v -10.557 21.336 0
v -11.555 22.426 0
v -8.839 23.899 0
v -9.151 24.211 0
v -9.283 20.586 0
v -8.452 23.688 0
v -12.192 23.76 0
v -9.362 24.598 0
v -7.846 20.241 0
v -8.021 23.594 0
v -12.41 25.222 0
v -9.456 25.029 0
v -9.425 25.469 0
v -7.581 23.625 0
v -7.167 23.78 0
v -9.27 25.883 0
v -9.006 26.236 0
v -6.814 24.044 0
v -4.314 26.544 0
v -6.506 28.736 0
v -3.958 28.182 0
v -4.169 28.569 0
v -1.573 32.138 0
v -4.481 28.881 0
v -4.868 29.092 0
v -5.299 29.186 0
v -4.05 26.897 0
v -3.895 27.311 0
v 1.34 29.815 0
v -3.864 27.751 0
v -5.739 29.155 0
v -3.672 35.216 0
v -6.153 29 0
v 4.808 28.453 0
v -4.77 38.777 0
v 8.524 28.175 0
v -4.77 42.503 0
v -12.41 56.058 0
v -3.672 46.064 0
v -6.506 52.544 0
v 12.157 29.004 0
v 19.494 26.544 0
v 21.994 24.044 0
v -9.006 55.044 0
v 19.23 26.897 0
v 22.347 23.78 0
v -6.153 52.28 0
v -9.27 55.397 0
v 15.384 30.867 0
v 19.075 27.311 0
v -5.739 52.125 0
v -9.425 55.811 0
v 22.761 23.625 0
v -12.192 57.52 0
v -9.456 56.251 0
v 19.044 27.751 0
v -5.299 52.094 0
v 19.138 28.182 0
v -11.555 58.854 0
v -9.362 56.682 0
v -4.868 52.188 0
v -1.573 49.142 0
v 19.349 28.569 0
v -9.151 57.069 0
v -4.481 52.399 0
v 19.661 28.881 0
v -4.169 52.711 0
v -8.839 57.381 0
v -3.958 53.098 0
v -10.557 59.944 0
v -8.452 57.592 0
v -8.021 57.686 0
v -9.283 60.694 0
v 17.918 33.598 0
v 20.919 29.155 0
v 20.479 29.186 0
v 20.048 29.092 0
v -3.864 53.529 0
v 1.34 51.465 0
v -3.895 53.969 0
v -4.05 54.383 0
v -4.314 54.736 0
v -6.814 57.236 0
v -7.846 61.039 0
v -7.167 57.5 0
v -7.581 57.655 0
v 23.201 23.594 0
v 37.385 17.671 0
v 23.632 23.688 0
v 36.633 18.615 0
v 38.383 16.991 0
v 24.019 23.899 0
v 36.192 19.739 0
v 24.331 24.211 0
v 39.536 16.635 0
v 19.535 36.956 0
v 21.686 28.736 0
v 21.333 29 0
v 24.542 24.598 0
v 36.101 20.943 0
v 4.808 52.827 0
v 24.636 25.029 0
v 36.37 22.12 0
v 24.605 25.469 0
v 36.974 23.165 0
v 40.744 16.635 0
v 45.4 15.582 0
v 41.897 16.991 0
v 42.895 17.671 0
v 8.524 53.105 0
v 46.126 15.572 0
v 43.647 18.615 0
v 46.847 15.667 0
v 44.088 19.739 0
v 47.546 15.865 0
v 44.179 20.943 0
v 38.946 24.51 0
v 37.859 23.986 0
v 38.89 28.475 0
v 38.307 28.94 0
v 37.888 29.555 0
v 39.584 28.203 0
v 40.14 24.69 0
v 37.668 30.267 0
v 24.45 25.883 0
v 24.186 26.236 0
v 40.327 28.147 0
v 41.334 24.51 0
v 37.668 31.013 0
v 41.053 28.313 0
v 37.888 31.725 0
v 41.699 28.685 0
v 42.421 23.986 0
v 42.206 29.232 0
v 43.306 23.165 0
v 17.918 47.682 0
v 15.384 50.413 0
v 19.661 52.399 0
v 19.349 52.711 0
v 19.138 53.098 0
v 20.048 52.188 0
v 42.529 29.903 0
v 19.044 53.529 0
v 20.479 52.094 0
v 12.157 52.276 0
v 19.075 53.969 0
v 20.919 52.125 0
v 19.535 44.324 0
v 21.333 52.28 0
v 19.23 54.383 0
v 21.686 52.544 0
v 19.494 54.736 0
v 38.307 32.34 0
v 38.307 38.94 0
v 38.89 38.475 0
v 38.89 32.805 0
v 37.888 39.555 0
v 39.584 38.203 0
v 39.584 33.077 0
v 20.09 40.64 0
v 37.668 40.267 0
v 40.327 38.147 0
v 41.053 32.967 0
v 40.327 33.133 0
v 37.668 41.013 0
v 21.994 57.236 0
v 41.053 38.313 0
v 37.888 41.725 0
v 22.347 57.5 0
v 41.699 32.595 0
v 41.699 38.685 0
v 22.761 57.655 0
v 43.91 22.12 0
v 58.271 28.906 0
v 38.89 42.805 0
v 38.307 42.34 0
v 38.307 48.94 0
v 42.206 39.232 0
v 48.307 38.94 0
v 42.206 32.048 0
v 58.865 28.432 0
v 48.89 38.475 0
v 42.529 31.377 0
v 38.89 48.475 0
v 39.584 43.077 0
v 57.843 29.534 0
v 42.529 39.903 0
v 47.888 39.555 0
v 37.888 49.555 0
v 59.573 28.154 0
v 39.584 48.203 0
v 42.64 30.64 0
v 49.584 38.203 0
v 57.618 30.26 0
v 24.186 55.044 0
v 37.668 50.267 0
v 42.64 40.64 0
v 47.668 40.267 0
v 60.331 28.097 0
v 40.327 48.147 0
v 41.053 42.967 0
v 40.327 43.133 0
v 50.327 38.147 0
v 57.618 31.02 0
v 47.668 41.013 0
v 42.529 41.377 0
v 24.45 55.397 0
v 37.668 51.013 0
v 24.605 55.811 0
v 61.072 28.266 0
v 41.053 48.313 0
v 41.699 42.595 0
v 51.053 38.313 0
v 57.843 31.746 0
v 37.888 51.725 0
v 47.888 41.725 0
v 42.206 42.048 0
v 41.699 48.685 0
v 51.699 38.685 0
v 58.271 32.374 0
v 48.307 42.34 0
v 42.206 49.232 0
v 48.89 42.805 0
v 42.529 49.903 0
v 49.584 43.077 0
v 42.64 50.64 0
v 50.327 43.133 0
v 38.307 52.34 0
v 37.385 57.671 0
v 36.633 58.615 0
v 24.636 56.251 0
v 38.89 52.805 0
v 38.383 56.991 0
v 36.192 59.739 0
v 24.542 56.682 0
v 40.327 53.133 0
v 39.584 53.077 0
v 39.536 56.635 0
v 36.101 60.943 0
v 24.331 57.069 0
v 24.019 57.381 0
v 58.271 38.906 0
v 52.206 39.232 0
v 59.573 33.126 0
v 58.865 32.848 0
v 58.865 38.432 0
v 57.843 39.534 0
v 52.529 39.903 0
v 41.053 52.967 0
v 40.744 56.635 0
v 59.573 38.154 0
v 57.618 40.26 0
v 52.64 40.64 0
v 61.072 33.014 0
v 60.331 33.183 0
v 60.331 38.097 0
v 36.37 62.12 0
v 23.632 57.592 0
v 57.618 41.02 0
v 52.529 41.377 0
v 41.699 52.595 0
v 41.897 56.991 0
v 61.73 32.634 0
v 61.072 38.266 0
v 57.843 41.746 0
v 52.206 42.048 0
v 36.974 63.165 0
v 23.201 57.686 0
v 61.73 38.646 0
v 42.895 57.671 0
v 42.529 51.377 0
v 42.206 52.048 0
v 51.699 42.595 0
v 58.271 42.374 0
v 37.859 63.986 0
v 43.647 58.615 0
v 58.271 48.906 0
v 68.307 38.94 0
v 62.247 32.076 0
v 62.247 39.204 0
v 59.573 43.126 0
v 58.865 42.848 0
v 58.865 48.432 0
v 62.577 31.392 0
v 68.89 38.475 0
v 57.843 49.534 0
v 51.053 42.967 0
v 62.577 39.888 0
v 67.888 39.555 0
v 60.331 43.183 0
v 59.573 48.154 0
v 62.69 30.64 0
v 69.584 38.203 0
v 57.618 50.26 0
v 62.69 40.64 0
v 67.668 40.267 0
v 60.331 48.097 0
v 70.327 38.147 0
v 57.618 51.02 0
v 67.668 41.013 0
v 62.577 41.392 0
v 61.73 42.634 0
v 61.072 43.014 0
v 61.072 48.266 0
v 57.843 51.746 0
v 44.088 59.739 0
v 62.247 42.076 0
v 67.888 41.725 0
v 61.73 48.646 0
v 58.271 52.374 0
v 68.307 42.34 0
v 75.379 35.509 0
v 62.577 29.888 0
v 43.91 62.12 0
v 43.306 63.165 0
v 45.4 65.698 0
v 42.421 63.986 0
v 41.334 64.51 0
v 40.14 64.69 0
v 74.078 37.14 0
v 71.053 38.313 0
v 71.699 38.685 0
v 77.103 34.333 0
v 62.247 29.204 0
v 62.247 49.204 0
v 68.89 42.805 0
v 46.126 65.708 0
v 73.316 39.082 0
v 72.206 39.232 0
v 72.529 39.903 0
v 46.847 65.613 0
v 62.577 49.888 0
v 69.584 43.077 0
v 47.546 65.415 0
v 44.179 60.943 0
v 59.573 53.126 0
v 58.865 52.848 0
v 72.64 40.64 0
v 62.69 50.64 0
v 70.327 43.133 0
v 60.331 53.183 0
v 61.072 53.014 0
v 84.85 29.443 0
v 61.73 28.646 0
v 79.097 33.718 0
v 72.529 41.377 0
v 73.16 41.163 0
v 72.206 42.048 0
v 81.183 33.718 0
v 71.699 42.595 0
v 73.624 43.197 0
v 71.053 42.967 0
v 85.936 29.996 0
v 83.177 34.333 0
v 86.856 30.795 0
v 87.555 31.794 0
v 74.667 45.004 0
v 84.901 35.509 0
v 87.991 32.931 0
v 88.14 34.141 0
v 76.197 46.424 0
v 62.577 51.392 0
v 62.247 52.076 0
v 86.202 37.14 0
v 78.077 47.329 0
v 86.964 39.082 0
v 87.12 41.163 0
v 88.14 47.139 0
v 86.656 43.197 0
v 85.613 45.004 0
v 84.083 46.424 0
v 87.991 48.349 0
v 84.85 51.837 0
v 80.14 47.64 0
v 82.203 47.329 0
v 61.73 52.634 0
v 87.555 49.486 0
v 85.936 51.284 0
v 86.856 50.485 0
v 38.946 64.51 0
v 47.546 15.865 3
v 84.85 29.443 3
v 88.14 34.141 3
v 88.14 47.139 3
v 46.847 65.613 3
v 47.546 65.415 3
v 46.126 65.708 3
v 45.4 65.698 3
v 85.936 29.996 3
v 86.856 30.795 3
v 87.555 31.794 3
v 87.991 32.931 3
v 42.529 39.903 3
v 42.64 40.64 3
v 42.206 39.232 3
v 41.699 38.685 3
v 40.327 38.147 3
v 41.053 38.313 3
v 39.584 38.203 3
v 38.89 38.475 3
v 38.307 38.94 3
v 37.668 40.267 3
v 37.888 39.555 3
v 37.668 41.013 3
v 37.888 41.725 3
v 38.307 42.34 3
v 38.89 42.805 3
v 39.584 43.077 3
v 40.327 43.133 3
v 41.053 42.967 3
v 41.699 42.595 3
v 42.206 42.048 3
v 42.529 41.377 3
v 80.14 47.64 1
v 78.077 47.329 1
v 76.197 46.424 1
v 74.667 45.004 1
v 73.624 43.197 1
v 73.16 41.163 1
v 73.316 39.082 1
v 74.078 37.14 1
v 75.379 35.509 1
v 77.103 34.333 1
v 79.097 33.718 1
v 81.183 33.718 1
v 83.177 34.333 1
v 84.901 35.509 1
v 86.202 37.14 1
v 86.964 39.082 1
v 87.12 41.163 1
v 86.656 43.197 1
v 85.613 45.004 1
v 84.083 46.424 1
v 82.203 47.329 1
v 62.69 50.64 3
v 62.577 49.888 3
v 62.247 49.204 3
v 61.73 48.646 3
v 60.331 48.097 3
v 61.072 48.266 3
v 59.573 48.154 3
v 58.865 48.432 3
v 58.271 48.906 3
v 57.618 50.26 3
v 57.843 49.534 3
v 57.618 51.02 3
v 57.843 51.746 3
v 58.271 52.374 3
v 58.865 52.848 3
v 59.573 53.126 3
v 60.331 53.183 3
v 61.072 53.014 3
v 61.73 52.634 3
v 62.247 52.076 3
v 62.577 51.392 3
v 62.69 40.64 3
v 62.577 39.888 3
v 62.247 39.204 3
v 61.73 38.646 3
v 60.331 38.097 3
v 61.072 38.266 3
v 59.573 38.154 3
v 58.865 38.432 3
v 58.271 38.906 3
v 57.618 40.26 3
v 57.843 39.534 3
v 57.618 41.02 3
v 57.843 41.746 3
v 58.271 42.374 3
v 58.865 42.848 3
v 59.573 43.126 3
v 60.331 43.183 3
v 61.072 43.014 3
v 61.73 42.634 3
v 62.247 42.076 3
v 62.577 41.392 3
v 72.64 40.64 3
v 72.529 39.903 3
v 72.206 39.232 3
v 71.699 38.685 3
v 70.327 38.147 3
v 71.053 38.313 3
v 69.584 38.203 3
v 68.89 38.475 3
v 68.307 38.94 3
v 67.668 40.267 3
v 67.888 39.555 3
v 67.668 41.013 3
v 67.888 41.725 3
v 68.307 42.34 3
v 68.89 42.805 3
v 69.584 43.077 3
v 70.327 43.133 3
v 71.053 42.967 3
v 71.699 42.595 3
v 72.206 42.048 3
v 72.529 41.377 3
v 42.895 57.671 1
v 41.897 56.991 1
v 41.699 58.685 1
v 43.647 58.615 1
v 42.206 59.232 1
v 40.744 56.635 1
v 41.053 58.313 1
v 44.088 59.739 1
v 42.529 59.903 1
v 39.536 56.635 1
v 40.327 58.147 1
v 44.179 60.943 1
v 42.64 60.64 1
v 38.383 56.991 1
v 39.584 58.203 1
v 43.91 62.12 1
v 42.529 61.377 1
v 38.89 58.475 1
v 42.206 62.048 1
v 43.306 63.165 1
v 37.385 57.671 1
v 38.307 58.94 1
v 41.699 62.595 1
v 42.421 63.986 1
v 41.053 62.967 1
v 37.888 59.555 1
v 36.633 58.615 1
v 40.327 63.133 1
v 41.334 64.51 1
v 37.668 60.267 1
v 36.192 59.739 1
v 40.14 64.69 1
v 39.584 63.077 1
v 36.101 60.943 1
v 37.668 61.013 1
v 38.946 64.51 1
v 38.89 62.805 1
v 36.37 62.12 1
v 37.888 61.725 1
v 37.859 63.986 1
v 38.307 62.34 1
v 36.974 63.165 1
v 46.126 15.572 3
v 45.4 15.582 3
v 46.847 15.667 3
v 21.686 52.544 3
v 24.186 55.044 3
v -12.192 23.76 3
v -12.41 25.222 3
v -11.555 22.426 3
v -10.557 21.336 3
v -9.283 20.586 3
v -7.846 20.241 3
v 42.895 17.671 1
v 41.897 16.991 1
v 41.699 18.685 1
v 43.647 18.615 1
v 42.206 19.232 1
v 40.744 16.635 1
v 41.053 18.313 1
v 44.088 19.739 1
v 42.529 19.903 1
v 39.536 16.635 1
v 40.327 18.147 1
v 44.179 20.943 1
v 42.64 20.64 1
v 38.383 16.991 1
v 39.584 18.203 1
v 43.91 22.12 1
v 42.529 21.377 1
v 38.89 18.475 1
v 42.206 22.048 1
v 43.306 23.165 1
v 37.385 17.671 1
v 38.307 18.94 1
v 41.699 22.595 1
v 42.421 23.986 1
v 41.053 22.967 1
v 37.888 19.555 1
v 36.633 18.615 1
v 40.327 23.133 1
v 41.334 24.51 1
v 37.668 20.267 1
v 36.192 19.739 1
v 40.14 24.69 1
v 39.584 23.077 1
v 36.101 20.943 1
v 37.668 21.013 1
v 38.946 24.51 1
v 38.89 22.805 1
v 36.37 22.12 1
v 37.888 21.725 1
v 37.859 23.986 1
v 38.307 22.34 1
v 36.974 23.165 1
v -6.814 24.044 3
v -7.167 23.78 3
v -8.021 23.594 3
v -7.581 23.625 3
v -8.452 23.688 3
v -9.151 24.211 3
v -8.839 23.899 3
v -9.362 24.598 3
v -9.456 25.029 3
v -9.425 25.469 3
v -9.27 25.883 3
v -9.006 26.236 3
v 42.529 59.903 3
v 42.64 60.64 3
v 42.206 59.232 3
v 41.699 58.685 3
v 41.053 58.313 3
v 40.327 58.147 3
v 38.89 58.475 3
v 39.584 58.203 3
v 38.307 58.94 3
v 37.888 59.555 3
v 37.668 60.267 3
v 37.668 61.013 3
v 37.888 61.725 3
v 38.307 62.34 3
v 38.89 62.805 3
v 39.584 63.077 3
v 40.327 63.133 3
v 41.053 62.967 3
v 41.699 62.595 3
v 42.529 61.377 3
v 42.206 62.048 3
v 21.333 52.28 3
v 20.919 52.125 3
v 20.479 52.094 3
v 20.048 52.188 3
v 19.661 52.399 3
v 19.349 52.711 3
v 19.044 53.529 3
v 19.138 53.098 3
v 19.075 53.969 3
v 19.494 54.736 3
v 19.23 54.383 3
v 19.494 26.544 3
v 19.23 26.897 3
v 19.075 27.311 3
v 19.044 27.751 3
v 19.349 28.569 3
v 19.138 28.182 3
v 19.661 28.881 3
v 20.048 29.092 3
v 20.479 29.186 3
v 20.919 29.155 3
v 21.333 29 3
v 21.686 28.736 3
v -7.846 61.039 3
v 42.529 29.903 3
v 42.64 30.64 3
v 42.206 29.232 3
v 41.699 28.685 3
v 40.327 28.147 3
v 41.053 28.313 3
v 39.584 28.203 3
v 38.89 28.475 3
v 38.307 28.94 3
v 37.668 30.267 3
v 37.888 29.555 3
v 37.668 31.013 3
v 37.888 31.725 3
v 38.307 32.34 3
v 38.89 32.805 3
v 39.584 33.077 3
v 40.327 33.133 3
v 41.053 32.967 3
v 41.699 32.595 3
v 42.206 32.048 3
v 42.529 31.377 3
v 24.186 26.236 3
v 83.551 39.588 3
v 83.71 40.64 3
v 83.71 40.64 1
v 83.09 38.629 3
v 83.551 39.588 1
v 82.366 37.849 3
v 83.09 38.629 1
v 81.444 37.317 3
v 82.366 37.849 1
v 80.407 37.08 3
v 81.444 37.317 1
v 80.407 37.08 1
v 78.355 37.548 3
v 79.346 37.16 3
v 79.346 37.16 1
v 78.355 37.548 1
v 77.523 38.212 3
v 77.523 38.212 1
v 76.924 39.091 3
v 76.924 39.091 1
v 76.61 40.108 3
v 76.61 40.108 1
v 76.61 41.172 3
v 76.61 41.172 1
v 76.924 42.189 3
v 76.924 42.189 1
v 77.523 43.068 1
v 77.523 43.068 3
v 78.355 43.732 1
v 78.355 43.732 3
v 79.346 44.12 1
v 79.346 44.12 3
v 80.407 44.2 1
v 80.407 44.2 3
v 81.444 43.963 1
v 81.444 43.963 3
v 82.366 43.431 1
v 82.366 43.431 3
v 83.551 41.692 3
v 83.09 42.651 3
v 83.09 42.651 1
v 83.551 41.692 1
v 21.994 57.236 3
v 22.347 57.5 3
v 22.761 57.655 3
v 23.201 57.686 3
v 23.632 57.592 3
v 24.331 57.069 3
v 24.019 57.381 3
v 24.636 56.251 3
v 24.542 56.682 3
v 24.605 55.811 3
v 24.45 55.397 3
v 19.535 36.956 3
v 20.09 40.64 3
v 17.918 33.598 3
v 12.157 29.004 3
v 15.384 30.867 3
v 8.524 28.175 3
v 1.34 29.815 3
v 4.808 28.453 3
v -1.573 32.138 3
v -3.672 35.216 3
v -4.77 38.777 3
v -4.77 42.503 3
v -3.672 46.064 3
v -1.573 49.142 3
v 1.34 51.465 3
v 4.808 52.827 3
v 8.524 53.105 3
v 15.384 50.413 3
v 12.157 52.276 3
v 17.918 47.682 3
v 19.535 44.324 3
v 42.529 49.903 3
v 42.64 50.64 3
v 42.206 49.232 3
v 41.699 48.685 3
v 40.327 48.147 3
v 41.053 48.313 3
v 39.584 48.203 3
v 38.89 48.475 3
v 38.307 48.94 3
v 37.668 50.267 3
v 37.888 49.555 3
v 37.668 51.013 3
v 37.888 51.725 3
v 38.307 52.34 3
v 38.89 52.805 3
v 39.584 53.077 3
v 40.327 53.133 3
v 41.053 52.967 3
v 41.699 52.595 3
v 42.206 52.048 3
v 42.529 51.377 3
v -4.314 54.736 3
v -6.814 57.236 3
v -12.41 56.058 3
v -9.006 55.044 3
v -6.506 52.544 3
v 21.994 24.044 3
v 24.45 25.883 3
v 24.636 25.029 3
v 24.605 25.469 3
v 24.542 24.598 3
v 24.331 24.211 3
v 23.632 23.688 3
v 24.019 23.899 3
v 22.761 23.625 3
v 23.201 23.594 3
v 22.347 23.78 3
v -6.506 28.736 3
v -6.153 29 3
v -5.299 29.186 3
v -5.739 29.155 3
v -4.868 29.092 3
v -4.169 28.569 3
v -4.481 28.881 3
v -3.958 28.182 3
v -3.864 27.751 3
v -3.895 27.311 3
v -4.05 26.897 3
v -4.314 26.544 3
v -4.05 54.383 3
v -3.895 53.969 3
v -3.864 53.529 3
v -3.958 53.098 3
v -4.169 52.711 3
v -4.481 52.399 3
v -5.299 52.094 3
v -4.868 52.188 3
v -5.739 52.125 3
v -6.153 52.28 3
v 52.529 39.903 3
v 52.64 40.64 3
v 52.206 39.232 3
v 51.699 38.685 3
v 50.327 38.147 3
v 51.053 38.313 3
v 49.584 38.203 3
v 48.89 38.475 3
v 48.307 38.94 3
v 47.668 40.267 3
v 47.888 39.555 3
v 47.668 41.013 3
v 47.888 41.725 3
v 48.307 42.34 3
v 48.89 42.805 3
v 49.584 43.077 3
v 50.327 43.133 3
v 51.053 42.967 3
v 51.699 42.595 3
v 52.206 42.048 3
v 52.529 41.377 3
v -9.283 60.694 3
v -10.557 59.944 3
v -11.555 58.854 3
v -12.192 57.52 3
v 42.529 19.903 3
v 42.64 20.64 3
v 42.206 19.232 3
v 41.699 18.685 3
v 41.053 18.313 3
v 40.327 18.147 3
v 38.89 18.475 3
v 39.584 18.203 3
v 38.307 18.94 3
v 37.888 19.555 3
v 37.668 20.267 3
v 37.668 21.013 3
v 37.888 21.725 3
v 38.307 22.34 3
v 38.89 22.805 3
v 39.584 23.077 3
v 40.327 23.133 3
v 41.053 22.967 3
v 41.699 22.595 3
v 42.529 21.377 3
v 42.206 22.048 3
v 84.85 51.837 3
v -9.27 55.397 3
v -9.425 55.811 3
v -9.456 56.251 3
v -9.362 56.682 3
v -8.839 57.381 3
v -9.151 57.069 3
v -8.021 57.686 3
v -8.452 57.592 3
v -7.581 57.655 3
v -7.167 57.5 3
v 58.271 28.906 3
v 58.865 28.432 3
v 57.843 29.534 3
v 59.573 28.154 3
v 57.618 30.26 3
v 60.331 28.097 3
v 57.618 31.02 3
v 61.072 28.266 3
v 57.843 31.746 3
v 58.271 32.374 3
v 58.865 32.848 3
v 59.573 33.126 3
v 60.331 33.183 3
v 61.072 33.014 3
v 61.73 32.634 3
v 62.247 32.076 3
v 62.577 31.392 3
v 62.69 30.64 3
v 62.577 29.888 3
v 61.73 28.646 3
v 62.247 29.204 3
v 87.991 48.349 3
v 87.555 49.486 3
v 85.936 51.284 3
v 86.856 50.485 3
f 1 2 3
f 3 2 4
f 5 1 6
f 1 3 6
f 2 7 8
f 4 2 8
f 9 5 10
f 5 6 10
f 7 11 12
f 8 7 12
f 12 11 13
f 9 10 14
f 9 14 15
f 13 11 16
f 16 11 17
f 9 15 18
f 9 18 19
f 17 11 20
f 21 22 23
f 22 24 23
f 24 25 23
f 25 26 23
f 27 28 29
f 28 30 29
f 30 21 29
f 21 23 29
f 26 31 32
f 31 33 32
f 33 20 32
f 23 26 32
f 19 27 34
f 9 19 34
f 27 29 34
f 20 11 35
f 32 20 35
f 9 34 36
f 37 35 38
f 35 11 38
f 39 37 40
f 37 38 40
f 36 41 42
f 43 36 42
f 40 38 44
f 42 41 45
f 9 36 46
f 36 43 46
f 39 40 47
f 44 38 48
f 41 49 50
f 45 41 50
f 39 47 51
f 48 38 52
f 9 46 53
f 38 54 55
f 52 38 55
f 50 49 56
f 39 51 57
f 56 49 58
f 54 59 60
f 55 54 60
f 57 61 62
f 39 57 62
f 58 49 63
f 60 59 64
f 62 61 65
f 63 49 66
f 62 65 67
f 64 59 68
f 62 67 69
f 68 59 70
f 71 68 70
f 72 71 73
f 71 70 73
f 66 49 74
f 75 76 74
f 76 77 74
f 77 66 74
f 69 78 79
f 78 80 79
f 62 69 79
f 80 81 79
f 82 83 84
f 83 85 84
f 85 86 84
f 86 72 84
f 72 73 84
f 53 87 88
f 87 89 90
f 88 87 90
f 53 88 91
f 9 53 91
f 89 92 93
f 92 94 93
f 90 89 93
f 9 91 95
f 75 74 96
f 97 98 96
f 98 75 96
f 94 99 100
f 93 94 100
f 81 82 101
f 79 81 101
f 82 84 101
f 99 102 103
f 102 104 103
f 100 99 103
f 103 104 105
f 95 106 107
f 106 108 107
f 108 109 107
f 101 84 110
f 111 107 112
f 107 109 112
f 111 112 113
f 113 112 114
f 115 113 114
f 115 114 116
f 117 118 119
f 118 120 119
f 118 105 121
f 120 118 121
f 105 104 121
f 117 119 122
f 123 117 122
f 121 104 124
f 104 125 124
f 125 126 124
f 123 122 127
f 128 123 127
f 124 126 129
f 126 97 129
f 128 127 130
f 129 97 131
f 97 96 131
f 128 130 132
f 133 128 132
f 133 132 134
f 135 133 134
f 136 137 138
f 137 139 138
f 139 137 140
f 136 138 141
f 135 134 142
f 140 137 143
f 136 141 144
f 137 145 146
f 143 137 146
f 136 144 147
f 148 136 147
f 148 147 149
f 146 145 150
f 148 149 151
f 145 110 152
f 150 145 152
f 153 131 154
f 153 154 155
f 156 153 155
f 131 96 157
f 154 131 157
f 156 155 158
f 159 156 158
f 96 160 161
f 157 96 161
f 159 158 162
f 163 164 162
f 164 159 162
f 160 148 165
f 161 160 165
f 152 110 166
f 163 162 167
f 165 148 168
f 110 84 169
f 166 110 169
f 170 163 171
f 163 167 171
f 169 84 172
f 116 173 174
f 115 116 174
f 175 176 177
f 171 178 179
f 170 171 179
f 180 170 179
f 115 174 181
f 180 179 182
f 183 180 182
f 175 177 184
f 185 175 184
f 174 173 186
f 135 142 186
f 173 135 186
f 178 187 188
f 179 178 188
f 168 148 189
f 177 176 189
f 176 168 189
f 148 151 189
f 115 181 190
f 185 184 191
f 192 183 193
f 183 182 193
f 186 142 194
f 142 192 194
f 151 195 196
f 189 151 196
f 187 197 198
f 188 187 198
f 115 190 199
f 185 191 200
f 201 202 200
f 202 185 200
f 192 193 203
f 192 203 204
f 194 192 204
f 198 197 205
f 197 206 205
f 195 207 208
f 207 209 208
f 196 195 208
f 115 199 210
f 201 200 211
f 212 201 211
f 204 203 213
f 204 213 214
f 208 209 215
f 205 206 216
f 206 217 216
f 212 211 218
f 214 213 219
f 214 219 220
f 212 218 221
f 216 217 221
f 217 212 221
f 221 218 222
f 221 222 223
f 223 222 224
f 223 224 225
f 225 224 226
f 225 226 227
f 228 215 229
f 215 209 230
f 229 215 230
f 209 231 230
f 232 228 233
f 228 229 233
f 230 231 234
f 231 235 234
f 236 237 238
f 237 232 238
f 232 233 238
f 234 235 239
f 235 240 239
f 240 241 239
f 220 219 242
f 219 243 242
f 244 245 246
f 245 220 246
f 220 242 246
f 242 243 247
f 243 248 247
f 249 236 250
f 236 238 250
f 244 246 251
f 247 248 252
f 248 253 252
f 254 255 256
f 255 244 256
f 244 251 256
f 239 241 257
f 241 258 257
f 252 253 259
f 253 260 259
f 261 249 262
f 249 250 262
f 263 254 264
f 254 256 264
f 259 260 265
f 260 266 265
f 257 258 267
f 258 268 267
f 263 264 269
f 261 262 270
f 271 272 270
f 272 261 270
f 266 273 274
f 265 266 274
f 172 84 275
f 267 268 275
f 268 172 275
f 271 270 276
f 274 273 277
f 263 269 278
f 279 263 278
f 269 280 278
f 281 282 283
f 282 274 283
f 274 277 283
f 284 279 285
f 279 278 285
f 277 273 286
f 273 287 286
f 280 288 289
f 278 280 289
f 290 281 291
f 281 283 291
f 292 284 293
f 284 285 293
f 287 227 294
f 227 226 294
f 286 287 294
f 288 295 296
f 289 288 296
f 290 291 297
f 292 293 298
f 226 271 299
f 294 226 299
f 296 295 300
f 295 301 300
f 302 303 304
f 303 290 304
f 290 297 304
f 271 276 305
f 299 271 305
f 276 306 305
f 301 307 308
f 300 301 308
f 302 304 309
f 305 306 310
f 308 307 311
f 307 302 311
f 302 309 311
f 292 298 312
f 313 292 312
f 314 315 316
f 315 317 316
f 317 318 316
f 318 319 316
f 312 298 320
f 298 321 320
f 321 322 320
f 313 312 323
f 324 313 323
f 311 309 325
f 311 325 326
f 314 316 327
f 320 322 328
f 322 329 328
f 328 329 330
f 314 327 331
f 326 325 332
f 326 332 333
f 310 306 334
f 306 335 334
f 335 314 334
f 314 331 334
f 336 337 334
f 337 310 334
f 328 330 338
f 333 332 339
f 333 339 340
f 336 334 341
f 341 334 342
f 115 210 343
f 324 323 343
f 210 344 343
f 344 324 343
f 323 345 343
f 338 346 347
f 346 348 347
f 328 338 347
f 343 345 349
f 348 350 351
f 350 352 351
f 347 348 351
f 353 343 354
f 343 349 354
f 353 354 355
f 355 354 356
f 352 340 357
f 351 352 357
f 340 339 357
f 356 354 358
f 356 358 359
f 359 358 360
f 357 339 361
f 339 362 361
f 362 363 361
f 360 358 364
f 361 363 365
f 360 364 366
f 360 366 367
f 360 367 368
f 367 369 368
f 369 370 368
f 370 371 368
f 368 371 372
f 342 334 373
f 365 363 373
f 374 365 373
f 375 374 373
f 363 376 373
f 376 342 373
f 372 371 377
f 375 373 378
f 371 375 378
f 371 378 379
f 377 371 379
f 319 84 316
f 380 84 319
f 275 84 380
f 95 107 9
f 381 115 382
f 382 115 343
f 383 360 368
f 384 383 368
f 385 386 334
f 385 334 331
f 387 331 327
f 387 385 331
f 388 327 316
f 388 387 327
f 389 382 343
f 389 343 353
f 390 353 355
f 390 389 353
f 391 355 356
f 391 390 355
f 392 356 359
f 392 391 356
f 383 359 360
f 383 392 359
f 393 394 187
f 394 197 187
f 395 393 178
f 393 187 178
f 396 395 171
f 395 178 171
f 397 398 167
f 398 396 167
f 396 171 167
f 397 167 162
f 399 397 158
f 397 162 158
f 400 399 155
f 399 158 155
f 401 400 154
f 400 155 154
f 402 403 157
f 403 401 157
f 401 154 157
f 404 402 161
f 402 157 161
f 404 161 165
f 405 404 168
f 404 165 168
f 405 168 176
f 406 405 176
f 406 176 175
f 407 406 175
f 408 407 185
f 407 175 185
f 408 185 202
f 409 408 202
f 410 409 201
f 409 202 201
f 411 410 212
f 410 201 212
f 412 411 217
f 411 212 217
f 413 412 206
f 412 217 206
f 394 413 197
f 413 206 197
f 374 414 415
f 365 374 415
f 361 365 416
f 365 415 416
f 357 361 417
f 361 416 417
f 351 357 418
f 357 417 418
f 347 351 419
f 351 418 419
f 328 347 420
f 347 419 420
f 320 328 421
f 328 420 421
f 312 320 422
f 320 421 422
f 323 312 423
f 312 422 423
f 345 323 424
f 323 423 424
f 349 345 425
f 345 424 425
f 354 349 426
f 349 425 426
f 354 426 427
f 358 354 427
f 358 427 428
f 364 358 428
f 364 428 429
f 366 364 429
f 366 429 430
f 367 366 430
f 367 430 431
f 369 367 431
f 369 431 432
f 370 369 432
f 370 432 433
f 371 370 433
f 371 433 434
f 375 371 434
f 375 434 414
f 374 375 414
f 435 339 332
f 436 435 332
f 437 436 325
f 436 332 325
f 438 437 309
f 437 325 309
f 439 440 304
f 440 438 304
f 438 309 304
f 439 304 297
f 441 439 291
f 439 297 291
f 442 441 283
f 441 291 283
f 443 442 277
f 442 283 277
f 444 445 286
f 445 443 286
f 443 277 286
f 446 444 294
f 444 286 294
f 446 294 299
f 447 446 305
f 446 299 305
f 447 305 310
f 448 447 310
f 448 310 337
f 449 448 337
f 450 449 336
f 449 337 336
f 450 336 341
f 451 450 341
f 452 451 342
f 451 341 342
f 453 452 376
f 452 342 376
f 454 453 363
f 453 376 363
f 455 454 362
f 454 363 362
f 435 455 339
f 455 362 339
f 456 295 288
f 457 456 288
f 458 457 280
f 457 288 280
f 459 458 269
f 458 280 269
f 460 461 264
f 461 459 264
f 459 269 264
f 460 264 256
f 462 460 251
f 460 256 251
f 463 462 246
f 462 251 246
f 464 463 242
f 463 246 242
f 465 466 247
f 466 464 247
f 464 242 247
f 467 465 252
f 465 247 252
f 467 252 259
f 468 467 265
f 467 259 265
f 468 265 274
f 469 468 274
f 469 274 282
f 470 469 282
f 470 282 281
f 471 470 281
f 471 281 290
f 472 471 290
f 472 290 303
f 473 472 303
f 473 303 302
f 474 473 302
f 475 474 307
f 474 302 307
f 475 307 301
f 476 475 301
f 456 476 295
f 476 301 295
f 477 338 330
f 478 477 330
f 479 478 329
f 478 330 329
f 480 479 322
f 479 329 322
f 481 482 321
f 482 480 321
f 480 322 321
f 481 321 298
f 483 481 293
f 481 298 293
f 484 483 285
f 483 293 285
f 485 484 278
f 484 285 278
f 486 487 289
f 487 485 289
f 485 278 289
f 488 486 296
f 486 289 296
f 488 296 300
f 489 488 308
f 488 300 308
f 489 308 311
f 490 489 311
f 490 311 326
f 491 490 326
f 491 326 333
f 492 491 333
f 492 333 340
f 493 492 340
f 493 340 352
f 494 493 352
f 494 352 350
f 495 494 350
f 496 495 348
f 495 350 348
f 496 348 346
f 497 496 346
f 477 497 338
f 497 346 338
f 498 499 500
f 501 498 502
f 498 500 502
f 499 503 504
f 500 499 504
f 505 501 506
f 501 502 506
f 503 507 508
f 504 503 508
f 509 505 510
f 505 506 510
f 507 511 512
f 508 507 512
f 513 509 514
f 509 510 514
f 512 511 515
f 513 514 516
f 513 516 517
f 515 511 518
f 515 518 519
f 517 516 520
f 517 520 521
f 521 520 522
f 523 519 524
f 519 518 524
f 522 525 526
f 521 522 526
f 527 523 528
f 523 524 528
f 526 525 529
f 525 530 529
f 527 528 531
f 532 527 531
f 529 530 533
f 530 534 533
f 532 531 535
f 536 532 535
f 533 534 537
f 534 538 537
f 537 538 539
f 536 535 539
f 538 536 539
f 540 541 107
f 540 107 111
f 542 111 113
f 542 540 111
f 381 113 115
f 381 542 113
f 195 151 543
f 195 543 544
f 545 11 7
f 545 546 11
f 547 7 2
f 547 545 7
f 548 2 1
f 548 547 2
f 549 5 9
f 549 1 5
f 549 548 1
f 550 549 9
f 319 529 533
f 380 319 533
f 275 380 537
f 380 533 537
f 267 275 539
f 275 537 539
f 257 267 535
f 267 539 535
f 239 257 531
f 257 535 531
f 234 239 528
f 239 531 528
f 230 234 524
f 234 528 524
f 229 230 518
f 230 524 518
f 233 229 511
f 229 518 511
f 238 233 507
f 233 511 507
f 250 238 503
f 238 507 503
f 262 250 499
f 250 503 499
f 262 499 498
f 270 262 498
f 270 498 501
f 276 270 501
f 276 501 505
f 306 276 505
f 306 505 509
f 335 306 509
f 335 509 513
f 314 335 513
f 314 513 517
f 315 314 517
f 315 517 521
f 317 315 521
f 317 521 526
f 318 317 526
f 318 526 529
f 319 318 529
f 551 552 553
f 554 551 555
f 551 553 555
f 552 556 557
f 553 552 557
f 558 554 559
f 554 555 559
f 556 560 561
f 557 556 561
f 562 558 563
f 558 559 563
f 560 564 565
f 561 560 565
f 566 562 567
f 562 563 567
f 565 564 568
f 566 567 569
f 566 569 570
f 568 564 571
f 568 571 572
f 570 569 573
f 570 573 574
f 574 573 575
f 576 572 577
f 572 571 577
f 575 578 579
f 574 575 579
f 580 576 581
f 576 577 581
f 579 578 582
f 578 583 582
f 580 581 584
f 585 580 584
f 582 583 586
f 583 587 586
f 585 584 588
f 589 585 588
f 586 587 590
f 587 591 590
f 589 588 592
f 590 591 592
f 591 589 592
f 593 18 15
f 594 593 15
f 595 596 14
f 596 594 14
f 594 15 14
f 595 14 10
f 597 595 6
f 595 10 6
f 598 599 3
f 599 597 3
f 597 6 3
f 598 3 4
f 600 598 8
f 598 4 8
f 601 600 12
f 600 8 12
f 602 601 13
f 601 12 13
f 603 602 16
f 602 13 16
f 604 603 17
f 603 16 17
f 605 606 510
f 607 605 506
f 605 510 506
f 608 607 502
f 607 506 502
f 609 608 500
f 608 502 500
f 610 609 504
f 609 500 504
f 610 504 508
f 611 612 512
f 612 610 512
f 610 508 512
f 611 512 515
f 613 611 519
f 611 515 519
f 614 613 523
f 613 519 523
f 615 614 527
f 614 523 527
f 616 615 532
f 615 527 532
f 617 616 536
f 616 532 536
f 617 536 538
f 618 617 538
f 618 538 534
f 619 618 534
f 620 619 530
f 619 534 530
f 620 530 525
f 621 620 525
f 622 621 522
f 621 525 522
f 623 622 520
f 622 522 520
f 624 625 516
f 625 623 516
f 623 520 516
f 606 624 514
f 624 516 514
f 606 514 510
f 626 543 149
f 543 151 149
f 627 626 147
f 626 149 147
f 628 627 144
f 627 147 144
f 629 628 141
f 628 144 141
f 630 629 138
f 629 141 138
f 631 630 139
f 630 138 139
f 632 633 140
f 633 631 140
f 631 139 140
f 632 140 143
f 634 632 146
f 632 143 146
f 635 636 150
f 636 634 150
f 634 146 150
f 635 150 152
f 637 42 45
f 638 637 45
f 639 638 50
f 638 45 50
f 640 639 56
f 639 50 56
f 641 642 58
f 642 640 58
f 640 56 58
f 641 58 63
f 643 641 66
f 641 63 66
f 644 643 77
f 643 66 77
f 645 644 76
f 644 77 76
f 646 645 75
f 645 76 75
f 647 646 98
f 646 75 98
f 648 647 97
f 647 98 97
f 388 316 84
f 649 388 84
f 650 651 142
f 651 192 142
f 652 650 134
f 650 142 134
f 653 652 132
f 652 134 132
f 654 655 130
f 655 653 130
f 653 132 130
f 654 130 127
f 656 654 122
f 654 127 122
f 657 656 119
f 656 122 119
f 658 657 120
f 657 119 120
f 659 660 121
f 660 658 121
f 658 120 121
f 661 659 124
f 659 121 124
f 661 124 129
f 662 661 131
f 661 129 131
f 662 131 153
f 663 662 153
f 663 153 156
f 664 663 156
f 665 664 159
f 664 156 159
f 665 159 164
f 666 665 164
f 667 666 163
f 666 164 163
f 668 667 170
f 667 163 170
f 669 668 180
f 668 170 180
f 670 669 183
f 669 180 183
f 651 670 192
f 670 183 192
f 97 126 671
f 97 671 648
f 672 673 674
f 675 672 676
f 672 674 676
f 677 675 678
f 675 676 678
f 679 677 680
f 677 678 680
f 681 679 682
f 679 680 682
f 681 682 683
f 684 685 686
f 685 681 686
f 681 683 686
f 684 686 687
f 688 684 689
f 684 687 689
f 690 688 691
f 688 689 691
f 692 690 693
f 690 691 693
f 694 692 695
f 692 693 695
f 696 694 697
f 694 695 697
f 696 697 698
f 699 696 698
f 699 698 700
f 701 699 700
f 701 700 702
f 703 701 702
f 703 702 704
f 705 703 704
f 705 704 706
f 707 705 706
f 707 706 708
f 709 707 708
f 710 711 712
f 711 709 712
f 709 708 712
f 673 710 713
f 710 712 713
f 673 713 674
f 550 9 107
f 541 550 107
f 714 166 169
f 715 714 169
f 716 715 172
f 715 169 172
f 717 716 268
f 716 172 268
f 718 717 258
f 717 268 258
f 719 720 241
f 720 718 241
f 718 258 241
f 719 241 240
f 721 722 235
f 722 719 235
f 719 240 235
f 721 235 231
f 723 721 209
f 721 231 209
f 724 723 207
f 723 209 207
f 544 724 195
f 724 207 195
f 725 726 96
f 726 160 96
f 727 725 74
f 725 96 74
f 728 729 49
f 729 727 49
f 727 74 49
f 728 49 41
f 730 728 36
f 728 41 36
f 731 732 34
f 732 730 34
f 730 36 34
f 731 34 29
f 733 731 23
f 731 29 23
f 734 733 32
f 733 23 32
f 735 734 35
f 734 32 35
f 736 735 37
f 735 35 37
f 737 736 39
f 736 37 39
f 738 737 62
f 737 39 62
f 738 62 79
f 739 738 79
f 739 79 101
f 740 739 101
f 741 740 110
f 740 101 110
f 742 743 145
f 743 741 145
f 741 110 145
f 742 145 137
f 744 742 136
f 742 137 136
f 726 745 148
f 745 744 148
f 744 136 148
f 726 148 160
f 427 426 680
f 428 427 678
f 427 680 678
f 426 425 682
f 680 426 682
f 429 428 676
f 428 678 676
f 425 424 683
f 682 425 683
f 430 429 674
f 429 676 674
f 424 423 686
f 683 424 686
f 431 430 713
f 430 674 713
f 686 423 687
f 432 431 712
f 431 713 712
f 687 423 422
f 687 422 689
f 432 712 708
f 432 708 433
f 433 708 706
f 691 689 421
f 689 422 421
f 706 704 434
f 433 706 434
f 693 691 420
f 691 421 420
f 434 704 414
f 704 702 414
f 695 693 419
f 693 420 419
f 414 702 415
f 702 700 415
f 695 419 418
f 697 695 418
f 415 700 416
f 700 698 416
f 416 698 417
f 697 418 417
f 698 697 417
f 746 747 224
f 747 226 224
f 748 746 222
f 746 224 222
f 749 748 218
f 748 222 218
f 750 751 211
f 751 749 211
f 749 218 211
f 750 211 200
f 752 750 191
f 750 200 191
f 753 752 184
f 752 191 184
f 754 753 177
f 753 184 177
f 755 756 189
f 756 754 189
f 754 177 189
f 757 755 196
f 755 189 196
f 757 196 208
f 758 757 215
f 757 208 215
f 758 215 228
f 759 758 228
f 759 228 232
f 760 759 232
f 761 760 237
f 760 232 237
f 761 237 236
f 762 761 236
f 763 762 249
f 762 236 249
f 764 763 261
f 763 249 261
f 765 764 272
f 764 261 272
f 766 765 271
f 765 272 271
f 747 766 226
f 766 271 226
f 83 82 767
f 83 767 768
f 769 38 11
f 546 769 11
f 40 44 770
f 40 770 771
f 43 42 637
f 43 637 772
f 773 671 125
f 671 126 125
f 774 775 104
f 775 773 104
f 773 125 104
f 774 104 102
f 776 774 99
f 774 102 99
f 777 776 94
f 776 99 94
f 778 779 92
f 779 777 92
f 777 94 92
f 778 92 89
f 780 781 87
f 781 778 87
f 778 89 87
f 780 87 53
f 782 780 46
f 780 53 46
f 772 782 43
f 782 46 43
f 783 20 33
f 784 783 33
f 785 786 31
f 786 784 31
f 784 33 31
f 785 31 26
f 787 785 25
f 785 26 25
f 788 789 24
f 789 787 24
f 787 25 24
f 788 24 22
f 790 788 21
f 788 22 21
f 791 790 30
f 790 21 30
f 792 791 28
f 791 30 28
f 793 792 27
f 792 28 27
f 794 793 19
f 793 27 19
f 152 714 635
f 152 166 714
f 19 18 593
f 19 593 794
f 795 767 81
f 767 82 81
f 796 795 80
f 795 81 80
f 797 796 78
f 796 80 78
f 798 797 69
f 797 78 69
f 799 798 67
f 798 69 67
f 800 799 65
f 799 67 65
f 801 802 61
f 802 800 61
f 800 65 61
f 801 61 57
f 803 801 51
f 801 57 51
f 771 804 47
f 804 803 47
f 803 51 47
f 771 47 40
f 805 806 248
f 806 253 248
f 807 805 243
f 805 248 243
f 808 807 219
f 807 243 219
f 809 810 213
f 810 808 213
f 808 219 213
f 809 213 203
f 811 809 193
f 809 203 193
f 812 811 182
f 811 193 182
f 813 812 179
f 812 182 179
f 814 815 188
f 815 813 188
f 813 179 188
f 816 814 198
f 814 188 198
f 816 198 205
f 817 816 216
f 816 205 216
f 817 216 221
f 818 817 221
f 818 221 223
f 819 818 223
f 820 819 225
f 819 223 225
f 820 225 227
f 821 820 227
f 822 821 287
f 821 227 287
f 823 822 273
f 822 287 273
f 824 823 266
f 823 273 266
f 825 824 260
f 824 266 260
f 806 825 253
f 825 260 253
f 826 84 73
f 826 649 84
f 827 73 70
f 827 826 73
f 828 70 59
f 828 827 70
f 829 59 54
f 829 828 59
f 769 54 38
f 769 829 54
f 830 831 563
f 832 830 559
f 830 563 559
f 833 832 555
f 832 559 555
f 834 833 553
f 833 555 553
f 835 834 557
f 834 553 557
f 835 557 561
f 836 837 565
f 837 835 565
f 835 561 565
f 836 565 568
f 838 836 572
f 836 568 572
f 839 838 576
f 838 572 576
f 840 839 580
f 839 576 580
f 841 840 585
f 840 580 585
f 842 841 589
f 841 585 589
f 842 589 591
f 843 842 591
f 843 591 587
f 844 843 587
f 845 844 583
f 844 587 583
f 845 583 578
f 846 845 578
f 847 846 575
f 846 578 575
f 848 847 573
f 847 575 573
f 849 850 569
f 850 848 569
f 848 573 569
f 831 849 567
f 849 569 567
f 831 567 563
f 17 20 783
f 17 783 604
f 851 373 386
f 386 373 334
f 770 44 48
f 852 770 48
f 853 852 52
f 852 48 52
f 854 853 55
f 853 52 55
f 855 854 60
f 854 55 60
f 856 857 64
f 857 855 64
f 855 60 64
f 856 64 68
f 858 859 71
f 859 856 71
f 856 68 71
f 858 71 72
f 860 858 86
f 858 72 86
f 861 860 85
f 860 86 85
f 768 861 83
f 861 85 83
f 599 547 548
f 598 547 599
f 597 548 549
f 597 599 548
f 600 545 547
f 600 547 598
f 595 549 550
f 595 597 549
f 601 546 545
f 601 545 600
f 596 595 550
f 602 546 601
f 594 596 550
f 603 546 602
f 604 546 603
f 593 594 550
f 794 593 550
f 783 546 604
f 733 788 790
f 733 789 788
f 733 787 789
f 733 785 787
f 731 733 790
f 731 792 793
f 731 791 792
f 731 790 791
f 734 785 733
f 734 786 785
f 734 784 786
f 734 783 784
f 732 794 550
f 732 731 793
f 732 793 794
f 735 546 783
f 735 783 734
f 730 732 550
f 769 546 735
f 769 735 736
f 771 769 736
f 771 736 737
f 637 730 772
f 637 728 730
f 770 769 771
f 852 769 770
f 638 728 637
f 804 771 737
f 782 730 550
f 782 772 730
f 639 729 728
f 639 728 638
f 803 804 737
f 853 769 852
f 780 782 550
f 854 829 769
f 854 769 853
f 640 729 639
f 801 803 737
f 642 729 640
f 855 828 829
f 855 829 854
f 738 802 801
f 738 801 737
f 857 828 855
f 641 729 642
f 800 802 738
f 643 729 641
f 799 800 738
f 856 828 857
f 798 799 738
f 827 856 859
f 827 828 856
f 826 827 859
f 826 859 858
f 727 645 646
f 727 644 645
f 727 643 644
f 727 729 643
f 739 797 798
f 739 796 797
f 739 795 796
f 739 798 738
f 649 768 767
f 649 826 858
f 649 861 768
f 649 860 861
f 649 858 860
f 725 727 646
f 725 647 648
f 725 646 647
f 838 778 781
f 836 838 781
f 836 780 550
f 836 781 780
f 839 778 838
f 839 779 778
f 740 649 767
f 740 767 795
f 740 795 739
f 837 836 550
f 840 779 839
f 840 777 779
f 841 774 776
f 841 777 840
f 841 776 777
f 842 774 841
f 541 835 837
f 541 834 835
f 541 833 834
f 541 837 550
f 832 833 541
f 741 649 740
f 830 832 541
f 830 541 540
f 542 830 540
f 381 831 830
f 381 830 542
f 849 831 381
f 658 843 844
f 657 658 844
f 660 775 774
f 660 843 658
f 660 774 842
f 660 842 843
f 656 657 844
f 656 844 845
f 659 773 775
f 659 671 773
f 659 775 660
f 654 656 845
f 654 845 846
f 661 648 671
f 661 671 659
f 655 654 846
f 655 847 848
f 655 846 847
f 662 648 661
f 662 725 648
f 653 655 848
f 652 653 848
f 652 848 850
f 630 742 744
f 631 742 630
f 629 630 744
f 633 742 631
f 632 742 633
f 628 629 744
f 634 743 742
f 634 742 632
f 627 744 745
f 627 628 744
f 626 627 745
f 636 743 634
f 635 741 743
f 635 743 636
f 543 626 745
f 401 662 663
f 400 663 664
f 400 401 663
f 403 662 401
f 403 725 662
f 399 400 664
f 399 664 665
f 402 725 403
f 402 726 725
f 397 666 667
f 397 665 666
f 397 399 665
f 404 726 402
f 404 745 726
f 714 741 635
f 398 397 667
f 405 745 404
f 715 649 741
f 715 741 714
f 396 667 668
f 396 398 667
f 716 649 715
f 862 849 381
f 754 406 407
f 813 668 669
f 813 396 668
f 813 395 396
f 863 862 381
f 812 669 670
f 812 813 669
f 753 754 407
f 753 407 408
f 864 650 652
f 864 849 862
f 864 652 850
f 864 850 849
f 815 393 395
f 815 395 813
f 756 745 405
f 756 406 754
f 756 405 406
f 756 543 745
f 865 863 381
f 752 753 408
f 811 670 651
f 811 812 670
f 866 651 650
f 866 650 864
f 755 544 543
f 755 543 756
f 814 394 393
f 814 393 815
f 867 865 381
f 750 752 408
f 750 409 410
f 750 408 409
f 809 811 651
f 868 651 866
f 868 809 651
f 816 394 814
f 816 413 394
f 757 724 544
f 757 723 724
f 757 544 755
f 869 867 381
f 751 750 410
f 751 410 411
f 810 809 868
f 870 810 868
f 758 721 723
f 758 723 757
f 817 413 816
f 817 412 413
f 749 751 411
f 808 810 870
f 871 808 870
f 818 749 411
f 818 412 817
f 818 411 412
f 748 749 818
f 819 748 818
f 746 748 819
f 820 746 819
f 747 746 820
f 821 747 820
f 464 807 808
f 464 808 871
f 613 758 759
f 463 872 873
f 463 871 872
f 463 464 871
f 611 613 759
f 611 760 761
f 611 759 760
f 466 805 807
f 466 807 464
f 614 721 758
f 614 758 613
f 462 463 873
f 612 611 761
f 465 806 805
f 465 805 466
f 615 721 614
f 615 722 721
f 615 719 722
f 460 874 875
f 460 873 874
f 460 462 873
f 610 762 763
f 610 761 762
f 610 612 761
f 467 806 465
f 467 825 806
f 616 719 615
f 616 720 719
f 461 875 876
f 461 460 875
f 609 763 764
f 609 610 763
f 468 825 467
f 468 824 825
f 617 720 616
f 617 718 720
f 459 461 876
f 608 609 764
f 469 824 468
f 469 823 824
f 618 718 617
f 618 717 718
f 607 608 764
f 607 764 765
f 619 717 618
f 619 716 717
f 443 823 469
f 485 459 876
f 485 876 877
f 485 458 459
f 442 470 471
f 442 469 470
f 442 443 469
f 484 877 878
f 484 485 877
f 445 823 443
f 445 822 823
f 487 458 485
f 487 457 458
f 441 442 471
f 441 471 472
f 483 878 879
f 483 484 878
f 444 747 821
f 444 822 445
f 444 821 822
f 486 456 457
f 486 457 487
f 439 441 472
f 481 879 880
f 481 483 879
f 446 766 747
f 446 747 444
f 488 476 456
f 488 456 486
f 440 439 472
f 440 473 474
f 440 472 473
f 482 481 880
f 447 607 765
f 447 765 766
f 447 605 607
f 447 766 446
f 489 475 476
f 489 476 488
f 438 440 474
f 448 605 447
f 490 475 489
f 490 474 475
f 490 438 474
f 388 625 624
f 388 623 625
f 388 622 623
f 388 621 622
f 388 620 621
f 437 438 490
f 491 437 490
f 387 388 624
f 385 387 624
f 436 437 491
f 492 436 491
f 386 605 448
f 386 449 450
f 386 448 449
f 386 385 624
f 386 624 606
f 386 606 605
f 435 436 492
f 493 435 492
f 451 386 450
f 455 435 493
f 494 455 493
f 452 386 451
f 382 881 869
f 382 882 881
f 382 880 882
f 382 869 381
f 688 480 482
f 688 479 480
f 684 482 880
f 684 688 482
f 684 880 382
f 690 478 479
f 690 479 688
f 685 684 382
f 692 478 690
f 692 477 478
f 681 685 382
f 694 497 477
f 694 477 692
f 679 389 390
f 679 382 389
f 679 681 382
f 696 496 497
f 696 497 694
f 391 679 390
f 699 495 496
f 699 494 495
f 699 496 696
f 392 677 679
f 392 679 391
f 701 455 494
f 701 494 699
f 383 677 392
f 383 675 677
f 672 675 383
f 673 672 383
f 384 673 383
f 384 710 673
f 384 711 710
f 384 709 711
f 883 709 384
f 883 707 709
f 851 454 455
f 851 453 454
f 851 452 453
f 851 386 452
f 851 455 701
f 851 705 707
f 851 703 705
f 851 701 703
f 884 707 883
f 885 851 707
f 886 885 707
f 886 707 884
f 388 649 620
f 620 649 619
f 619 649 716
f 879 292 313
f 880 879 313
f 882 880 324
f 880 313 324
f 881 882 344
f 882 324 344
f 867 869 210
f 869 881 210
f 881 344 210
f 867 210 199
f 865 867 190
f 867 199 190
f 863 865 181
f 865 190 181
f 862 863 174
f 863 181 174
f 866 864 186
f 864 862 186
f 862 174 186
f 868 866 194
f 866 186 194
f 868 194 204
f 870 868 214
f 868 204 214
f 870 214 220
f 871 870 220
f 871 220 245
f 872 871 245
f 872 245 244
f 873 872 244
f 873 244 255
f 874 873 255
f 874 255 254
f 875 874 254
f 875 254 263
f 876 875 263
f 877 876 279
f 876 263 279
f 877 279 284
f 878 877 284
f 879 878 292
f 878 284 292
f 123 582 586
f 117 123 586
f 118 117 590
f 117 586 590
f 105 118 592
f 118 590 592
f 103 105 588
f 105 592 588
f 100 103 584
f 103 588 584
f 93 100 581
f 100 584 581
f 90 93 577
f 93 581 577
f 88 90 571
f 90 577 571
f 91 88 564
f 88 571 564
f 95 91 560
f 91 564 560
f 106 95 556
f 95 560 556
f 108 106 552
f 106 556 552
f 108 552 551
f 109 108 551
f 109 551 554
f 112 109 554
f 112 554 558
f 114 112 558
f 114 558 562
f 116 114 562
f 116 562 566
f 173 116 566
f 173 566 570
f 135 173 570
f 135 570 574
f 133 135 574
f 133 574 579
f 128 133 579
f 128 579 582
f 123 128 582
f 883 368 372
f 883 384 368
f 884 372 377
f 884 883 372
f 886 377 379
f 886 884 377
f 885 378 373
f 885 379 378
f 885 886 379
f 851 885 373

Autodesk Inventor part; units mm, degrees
ref_plane "YZ Plane" through (0, 0, 0) normal (1, 0, 0) x (0, 1, 0)
ref_plane "XZ Plane" through (0, 0, 0) normal (0, 1, 0) x (-1, 0, 0)
ref_plane "XY Plane" through (0, 0, 0) normal (0, 0, 1) x (1, 0, 0)
sketch "Sketch1" plane through (0, 0, 0) normal (0, 0, 1) x (1, 0, 0)
  circle A0 centre (80.14, 40.64) radius 3.57 projected
  circle A1 centre (40.14, 40.64) radius 2.5 projected
  circle A2 centre (40.14, 50.64) radius 2.5 projected
  circle A3 centre (40.14, 60.64) radius 2.5 projected
  circle A4 centre (40.14, 30.64) radius 2.5 projected
  circle A5 centre (40.14, 20.64) radius 2.5 projected
  circle A6 centre (7.59, 40.64) radius 12.5 projected
  arc A7 (-4.314, 26.544) -> (-6.506, 28.736) centre (-5.41, 27.64) ccw projected
  line L0 (-6.814, 24.044) -> (-4.314, 26.544) projected
  arc A8 (-9.006, 26.236) -> (-6.814, 24.044) centre (-7.91, 25.14) ccw projected
  line L1 (-6.506, 28.736) -> (-9.006, 26.236) projected
  line L2 (-4.314, 54.736) -> (-6.814, 57.236) projected
  arc A9 (-6.506, 52.544) -> (-4.314, 54.736) centre (-5.41, 53.64) ccw projected
  line L3 (-9.006, 55.044) -> (-6.506, 52.544) projected
  arc A10 (-6.814, 57.236) -> (-9.006, 55.044) centre (-7.91, 56.14) ccw projected
  line L4 (21.994, 57.236) -> (19.494, 54.736) projected
  arc A11 (19.494, 54.736) -> (21.686, 52.544) centre (20.59, 53.64) ccw projected
  line L5 (21.686, 52.544) -> (24.186, 55.044) projected
  arc A12 (24.186, 55.044) -> (21.994, 57.236) centre (23.09, 56.14) ccw projected
  line L6 (24.186, 26.236) -> (21.686, 28.736) projected
  arc A13 (21.686, 28.736) -> (19.494, 26.544) centre (20.59, 27.64) ccw projected
  line L7 (19.494, 26.544) -> (21.994, 24.044) projected
  arc A14 (21.994, 24.044) -> (24.186, 26.236) centre (23.09, 25.14) ccw projected
  circle A15 centre (60.14, 40.64) radius 2.55 projected
  circle A16 centre (60.14, 30.64) radius 2.55 projected
  circle A17 centre (70.14, 40.64) radius 2.5 projected
  circle A18 centre (60.14, 50.64) radius 2.55 projected
  circle A19 centre (50.14, 40.64) radius 2.5 projected
  line L8 (-12.41, 60.64) -> (-12.41, 20.64)
  line L9 (-12.41, 20.64) -> (46.5039, 15.4857)
  line L10 (46.5039, 15.4857) -> (88.14, 30.64)
  line L11 (88.14, 30.64) -> (88.14, 50.64)
  line L12 (88.14, 50.64) -> (46.5039, 65.7943)
  line L13 (46.5039, 65.7943) -> (-12.41, 60.64)
  point P0 (0, 0)
  dimension "d0" = 40
  dimension "d1" = 20
  dimension "d2" = 20
  dimension "d3" = 8
  dimension "d4" = 10
  dimension "d5" = 20
  dimension "d6" = 95
  dimension "d7" = 95
  dimension "d8" = 110
  dimension "d9" = 110
extrude "Extrusion1" add sketch "Sketch1" along normal blind 3
fillet "Fillet1" radius 5 6 edges at (-12.41, 20.64, 1.5) (46.5039, 15.4857, 1.5) (-12.41, 60.64, 1.5) (46.5039, 65.7943, 1.5) (88.14, 50.64, 1.5) (88.14, 30.64, 1.5)
sketch "Sketch2" plane through (0, 0, 0) normal (0, 0, -1) x (-1, 0, 0)
  circle A0 centre (-40.14, 20.64) radius 2.5 projected
  circle A1 centre (-80.14, 40.64) radius 3.57 projected
  circle A2 centre (-40.14, 60.64) radius 2.5 projected
  point P0 (0, 0)
hole "Hole1" at (40.14, 20.64, 0) at (40.14, 60.64, 0) direction (0, 0, 1) diameter 8.1 depth 1
sketch "Sketch3" plane through (0, 0, 0) normal (0, 0, -1) x (-1, 0, 0)
  circle A0 centre (-80.14, 40.64) radius 3.57 projected
  point P0 (0, 0)
hole "Hole2" at (80.14, 40.64, 0) direction (0, 0, 1) diameter 14 depth 1
equation "\"d7\" = d6"
properties part number "2020 Slider Motorized" material "Aluminum 6061"
